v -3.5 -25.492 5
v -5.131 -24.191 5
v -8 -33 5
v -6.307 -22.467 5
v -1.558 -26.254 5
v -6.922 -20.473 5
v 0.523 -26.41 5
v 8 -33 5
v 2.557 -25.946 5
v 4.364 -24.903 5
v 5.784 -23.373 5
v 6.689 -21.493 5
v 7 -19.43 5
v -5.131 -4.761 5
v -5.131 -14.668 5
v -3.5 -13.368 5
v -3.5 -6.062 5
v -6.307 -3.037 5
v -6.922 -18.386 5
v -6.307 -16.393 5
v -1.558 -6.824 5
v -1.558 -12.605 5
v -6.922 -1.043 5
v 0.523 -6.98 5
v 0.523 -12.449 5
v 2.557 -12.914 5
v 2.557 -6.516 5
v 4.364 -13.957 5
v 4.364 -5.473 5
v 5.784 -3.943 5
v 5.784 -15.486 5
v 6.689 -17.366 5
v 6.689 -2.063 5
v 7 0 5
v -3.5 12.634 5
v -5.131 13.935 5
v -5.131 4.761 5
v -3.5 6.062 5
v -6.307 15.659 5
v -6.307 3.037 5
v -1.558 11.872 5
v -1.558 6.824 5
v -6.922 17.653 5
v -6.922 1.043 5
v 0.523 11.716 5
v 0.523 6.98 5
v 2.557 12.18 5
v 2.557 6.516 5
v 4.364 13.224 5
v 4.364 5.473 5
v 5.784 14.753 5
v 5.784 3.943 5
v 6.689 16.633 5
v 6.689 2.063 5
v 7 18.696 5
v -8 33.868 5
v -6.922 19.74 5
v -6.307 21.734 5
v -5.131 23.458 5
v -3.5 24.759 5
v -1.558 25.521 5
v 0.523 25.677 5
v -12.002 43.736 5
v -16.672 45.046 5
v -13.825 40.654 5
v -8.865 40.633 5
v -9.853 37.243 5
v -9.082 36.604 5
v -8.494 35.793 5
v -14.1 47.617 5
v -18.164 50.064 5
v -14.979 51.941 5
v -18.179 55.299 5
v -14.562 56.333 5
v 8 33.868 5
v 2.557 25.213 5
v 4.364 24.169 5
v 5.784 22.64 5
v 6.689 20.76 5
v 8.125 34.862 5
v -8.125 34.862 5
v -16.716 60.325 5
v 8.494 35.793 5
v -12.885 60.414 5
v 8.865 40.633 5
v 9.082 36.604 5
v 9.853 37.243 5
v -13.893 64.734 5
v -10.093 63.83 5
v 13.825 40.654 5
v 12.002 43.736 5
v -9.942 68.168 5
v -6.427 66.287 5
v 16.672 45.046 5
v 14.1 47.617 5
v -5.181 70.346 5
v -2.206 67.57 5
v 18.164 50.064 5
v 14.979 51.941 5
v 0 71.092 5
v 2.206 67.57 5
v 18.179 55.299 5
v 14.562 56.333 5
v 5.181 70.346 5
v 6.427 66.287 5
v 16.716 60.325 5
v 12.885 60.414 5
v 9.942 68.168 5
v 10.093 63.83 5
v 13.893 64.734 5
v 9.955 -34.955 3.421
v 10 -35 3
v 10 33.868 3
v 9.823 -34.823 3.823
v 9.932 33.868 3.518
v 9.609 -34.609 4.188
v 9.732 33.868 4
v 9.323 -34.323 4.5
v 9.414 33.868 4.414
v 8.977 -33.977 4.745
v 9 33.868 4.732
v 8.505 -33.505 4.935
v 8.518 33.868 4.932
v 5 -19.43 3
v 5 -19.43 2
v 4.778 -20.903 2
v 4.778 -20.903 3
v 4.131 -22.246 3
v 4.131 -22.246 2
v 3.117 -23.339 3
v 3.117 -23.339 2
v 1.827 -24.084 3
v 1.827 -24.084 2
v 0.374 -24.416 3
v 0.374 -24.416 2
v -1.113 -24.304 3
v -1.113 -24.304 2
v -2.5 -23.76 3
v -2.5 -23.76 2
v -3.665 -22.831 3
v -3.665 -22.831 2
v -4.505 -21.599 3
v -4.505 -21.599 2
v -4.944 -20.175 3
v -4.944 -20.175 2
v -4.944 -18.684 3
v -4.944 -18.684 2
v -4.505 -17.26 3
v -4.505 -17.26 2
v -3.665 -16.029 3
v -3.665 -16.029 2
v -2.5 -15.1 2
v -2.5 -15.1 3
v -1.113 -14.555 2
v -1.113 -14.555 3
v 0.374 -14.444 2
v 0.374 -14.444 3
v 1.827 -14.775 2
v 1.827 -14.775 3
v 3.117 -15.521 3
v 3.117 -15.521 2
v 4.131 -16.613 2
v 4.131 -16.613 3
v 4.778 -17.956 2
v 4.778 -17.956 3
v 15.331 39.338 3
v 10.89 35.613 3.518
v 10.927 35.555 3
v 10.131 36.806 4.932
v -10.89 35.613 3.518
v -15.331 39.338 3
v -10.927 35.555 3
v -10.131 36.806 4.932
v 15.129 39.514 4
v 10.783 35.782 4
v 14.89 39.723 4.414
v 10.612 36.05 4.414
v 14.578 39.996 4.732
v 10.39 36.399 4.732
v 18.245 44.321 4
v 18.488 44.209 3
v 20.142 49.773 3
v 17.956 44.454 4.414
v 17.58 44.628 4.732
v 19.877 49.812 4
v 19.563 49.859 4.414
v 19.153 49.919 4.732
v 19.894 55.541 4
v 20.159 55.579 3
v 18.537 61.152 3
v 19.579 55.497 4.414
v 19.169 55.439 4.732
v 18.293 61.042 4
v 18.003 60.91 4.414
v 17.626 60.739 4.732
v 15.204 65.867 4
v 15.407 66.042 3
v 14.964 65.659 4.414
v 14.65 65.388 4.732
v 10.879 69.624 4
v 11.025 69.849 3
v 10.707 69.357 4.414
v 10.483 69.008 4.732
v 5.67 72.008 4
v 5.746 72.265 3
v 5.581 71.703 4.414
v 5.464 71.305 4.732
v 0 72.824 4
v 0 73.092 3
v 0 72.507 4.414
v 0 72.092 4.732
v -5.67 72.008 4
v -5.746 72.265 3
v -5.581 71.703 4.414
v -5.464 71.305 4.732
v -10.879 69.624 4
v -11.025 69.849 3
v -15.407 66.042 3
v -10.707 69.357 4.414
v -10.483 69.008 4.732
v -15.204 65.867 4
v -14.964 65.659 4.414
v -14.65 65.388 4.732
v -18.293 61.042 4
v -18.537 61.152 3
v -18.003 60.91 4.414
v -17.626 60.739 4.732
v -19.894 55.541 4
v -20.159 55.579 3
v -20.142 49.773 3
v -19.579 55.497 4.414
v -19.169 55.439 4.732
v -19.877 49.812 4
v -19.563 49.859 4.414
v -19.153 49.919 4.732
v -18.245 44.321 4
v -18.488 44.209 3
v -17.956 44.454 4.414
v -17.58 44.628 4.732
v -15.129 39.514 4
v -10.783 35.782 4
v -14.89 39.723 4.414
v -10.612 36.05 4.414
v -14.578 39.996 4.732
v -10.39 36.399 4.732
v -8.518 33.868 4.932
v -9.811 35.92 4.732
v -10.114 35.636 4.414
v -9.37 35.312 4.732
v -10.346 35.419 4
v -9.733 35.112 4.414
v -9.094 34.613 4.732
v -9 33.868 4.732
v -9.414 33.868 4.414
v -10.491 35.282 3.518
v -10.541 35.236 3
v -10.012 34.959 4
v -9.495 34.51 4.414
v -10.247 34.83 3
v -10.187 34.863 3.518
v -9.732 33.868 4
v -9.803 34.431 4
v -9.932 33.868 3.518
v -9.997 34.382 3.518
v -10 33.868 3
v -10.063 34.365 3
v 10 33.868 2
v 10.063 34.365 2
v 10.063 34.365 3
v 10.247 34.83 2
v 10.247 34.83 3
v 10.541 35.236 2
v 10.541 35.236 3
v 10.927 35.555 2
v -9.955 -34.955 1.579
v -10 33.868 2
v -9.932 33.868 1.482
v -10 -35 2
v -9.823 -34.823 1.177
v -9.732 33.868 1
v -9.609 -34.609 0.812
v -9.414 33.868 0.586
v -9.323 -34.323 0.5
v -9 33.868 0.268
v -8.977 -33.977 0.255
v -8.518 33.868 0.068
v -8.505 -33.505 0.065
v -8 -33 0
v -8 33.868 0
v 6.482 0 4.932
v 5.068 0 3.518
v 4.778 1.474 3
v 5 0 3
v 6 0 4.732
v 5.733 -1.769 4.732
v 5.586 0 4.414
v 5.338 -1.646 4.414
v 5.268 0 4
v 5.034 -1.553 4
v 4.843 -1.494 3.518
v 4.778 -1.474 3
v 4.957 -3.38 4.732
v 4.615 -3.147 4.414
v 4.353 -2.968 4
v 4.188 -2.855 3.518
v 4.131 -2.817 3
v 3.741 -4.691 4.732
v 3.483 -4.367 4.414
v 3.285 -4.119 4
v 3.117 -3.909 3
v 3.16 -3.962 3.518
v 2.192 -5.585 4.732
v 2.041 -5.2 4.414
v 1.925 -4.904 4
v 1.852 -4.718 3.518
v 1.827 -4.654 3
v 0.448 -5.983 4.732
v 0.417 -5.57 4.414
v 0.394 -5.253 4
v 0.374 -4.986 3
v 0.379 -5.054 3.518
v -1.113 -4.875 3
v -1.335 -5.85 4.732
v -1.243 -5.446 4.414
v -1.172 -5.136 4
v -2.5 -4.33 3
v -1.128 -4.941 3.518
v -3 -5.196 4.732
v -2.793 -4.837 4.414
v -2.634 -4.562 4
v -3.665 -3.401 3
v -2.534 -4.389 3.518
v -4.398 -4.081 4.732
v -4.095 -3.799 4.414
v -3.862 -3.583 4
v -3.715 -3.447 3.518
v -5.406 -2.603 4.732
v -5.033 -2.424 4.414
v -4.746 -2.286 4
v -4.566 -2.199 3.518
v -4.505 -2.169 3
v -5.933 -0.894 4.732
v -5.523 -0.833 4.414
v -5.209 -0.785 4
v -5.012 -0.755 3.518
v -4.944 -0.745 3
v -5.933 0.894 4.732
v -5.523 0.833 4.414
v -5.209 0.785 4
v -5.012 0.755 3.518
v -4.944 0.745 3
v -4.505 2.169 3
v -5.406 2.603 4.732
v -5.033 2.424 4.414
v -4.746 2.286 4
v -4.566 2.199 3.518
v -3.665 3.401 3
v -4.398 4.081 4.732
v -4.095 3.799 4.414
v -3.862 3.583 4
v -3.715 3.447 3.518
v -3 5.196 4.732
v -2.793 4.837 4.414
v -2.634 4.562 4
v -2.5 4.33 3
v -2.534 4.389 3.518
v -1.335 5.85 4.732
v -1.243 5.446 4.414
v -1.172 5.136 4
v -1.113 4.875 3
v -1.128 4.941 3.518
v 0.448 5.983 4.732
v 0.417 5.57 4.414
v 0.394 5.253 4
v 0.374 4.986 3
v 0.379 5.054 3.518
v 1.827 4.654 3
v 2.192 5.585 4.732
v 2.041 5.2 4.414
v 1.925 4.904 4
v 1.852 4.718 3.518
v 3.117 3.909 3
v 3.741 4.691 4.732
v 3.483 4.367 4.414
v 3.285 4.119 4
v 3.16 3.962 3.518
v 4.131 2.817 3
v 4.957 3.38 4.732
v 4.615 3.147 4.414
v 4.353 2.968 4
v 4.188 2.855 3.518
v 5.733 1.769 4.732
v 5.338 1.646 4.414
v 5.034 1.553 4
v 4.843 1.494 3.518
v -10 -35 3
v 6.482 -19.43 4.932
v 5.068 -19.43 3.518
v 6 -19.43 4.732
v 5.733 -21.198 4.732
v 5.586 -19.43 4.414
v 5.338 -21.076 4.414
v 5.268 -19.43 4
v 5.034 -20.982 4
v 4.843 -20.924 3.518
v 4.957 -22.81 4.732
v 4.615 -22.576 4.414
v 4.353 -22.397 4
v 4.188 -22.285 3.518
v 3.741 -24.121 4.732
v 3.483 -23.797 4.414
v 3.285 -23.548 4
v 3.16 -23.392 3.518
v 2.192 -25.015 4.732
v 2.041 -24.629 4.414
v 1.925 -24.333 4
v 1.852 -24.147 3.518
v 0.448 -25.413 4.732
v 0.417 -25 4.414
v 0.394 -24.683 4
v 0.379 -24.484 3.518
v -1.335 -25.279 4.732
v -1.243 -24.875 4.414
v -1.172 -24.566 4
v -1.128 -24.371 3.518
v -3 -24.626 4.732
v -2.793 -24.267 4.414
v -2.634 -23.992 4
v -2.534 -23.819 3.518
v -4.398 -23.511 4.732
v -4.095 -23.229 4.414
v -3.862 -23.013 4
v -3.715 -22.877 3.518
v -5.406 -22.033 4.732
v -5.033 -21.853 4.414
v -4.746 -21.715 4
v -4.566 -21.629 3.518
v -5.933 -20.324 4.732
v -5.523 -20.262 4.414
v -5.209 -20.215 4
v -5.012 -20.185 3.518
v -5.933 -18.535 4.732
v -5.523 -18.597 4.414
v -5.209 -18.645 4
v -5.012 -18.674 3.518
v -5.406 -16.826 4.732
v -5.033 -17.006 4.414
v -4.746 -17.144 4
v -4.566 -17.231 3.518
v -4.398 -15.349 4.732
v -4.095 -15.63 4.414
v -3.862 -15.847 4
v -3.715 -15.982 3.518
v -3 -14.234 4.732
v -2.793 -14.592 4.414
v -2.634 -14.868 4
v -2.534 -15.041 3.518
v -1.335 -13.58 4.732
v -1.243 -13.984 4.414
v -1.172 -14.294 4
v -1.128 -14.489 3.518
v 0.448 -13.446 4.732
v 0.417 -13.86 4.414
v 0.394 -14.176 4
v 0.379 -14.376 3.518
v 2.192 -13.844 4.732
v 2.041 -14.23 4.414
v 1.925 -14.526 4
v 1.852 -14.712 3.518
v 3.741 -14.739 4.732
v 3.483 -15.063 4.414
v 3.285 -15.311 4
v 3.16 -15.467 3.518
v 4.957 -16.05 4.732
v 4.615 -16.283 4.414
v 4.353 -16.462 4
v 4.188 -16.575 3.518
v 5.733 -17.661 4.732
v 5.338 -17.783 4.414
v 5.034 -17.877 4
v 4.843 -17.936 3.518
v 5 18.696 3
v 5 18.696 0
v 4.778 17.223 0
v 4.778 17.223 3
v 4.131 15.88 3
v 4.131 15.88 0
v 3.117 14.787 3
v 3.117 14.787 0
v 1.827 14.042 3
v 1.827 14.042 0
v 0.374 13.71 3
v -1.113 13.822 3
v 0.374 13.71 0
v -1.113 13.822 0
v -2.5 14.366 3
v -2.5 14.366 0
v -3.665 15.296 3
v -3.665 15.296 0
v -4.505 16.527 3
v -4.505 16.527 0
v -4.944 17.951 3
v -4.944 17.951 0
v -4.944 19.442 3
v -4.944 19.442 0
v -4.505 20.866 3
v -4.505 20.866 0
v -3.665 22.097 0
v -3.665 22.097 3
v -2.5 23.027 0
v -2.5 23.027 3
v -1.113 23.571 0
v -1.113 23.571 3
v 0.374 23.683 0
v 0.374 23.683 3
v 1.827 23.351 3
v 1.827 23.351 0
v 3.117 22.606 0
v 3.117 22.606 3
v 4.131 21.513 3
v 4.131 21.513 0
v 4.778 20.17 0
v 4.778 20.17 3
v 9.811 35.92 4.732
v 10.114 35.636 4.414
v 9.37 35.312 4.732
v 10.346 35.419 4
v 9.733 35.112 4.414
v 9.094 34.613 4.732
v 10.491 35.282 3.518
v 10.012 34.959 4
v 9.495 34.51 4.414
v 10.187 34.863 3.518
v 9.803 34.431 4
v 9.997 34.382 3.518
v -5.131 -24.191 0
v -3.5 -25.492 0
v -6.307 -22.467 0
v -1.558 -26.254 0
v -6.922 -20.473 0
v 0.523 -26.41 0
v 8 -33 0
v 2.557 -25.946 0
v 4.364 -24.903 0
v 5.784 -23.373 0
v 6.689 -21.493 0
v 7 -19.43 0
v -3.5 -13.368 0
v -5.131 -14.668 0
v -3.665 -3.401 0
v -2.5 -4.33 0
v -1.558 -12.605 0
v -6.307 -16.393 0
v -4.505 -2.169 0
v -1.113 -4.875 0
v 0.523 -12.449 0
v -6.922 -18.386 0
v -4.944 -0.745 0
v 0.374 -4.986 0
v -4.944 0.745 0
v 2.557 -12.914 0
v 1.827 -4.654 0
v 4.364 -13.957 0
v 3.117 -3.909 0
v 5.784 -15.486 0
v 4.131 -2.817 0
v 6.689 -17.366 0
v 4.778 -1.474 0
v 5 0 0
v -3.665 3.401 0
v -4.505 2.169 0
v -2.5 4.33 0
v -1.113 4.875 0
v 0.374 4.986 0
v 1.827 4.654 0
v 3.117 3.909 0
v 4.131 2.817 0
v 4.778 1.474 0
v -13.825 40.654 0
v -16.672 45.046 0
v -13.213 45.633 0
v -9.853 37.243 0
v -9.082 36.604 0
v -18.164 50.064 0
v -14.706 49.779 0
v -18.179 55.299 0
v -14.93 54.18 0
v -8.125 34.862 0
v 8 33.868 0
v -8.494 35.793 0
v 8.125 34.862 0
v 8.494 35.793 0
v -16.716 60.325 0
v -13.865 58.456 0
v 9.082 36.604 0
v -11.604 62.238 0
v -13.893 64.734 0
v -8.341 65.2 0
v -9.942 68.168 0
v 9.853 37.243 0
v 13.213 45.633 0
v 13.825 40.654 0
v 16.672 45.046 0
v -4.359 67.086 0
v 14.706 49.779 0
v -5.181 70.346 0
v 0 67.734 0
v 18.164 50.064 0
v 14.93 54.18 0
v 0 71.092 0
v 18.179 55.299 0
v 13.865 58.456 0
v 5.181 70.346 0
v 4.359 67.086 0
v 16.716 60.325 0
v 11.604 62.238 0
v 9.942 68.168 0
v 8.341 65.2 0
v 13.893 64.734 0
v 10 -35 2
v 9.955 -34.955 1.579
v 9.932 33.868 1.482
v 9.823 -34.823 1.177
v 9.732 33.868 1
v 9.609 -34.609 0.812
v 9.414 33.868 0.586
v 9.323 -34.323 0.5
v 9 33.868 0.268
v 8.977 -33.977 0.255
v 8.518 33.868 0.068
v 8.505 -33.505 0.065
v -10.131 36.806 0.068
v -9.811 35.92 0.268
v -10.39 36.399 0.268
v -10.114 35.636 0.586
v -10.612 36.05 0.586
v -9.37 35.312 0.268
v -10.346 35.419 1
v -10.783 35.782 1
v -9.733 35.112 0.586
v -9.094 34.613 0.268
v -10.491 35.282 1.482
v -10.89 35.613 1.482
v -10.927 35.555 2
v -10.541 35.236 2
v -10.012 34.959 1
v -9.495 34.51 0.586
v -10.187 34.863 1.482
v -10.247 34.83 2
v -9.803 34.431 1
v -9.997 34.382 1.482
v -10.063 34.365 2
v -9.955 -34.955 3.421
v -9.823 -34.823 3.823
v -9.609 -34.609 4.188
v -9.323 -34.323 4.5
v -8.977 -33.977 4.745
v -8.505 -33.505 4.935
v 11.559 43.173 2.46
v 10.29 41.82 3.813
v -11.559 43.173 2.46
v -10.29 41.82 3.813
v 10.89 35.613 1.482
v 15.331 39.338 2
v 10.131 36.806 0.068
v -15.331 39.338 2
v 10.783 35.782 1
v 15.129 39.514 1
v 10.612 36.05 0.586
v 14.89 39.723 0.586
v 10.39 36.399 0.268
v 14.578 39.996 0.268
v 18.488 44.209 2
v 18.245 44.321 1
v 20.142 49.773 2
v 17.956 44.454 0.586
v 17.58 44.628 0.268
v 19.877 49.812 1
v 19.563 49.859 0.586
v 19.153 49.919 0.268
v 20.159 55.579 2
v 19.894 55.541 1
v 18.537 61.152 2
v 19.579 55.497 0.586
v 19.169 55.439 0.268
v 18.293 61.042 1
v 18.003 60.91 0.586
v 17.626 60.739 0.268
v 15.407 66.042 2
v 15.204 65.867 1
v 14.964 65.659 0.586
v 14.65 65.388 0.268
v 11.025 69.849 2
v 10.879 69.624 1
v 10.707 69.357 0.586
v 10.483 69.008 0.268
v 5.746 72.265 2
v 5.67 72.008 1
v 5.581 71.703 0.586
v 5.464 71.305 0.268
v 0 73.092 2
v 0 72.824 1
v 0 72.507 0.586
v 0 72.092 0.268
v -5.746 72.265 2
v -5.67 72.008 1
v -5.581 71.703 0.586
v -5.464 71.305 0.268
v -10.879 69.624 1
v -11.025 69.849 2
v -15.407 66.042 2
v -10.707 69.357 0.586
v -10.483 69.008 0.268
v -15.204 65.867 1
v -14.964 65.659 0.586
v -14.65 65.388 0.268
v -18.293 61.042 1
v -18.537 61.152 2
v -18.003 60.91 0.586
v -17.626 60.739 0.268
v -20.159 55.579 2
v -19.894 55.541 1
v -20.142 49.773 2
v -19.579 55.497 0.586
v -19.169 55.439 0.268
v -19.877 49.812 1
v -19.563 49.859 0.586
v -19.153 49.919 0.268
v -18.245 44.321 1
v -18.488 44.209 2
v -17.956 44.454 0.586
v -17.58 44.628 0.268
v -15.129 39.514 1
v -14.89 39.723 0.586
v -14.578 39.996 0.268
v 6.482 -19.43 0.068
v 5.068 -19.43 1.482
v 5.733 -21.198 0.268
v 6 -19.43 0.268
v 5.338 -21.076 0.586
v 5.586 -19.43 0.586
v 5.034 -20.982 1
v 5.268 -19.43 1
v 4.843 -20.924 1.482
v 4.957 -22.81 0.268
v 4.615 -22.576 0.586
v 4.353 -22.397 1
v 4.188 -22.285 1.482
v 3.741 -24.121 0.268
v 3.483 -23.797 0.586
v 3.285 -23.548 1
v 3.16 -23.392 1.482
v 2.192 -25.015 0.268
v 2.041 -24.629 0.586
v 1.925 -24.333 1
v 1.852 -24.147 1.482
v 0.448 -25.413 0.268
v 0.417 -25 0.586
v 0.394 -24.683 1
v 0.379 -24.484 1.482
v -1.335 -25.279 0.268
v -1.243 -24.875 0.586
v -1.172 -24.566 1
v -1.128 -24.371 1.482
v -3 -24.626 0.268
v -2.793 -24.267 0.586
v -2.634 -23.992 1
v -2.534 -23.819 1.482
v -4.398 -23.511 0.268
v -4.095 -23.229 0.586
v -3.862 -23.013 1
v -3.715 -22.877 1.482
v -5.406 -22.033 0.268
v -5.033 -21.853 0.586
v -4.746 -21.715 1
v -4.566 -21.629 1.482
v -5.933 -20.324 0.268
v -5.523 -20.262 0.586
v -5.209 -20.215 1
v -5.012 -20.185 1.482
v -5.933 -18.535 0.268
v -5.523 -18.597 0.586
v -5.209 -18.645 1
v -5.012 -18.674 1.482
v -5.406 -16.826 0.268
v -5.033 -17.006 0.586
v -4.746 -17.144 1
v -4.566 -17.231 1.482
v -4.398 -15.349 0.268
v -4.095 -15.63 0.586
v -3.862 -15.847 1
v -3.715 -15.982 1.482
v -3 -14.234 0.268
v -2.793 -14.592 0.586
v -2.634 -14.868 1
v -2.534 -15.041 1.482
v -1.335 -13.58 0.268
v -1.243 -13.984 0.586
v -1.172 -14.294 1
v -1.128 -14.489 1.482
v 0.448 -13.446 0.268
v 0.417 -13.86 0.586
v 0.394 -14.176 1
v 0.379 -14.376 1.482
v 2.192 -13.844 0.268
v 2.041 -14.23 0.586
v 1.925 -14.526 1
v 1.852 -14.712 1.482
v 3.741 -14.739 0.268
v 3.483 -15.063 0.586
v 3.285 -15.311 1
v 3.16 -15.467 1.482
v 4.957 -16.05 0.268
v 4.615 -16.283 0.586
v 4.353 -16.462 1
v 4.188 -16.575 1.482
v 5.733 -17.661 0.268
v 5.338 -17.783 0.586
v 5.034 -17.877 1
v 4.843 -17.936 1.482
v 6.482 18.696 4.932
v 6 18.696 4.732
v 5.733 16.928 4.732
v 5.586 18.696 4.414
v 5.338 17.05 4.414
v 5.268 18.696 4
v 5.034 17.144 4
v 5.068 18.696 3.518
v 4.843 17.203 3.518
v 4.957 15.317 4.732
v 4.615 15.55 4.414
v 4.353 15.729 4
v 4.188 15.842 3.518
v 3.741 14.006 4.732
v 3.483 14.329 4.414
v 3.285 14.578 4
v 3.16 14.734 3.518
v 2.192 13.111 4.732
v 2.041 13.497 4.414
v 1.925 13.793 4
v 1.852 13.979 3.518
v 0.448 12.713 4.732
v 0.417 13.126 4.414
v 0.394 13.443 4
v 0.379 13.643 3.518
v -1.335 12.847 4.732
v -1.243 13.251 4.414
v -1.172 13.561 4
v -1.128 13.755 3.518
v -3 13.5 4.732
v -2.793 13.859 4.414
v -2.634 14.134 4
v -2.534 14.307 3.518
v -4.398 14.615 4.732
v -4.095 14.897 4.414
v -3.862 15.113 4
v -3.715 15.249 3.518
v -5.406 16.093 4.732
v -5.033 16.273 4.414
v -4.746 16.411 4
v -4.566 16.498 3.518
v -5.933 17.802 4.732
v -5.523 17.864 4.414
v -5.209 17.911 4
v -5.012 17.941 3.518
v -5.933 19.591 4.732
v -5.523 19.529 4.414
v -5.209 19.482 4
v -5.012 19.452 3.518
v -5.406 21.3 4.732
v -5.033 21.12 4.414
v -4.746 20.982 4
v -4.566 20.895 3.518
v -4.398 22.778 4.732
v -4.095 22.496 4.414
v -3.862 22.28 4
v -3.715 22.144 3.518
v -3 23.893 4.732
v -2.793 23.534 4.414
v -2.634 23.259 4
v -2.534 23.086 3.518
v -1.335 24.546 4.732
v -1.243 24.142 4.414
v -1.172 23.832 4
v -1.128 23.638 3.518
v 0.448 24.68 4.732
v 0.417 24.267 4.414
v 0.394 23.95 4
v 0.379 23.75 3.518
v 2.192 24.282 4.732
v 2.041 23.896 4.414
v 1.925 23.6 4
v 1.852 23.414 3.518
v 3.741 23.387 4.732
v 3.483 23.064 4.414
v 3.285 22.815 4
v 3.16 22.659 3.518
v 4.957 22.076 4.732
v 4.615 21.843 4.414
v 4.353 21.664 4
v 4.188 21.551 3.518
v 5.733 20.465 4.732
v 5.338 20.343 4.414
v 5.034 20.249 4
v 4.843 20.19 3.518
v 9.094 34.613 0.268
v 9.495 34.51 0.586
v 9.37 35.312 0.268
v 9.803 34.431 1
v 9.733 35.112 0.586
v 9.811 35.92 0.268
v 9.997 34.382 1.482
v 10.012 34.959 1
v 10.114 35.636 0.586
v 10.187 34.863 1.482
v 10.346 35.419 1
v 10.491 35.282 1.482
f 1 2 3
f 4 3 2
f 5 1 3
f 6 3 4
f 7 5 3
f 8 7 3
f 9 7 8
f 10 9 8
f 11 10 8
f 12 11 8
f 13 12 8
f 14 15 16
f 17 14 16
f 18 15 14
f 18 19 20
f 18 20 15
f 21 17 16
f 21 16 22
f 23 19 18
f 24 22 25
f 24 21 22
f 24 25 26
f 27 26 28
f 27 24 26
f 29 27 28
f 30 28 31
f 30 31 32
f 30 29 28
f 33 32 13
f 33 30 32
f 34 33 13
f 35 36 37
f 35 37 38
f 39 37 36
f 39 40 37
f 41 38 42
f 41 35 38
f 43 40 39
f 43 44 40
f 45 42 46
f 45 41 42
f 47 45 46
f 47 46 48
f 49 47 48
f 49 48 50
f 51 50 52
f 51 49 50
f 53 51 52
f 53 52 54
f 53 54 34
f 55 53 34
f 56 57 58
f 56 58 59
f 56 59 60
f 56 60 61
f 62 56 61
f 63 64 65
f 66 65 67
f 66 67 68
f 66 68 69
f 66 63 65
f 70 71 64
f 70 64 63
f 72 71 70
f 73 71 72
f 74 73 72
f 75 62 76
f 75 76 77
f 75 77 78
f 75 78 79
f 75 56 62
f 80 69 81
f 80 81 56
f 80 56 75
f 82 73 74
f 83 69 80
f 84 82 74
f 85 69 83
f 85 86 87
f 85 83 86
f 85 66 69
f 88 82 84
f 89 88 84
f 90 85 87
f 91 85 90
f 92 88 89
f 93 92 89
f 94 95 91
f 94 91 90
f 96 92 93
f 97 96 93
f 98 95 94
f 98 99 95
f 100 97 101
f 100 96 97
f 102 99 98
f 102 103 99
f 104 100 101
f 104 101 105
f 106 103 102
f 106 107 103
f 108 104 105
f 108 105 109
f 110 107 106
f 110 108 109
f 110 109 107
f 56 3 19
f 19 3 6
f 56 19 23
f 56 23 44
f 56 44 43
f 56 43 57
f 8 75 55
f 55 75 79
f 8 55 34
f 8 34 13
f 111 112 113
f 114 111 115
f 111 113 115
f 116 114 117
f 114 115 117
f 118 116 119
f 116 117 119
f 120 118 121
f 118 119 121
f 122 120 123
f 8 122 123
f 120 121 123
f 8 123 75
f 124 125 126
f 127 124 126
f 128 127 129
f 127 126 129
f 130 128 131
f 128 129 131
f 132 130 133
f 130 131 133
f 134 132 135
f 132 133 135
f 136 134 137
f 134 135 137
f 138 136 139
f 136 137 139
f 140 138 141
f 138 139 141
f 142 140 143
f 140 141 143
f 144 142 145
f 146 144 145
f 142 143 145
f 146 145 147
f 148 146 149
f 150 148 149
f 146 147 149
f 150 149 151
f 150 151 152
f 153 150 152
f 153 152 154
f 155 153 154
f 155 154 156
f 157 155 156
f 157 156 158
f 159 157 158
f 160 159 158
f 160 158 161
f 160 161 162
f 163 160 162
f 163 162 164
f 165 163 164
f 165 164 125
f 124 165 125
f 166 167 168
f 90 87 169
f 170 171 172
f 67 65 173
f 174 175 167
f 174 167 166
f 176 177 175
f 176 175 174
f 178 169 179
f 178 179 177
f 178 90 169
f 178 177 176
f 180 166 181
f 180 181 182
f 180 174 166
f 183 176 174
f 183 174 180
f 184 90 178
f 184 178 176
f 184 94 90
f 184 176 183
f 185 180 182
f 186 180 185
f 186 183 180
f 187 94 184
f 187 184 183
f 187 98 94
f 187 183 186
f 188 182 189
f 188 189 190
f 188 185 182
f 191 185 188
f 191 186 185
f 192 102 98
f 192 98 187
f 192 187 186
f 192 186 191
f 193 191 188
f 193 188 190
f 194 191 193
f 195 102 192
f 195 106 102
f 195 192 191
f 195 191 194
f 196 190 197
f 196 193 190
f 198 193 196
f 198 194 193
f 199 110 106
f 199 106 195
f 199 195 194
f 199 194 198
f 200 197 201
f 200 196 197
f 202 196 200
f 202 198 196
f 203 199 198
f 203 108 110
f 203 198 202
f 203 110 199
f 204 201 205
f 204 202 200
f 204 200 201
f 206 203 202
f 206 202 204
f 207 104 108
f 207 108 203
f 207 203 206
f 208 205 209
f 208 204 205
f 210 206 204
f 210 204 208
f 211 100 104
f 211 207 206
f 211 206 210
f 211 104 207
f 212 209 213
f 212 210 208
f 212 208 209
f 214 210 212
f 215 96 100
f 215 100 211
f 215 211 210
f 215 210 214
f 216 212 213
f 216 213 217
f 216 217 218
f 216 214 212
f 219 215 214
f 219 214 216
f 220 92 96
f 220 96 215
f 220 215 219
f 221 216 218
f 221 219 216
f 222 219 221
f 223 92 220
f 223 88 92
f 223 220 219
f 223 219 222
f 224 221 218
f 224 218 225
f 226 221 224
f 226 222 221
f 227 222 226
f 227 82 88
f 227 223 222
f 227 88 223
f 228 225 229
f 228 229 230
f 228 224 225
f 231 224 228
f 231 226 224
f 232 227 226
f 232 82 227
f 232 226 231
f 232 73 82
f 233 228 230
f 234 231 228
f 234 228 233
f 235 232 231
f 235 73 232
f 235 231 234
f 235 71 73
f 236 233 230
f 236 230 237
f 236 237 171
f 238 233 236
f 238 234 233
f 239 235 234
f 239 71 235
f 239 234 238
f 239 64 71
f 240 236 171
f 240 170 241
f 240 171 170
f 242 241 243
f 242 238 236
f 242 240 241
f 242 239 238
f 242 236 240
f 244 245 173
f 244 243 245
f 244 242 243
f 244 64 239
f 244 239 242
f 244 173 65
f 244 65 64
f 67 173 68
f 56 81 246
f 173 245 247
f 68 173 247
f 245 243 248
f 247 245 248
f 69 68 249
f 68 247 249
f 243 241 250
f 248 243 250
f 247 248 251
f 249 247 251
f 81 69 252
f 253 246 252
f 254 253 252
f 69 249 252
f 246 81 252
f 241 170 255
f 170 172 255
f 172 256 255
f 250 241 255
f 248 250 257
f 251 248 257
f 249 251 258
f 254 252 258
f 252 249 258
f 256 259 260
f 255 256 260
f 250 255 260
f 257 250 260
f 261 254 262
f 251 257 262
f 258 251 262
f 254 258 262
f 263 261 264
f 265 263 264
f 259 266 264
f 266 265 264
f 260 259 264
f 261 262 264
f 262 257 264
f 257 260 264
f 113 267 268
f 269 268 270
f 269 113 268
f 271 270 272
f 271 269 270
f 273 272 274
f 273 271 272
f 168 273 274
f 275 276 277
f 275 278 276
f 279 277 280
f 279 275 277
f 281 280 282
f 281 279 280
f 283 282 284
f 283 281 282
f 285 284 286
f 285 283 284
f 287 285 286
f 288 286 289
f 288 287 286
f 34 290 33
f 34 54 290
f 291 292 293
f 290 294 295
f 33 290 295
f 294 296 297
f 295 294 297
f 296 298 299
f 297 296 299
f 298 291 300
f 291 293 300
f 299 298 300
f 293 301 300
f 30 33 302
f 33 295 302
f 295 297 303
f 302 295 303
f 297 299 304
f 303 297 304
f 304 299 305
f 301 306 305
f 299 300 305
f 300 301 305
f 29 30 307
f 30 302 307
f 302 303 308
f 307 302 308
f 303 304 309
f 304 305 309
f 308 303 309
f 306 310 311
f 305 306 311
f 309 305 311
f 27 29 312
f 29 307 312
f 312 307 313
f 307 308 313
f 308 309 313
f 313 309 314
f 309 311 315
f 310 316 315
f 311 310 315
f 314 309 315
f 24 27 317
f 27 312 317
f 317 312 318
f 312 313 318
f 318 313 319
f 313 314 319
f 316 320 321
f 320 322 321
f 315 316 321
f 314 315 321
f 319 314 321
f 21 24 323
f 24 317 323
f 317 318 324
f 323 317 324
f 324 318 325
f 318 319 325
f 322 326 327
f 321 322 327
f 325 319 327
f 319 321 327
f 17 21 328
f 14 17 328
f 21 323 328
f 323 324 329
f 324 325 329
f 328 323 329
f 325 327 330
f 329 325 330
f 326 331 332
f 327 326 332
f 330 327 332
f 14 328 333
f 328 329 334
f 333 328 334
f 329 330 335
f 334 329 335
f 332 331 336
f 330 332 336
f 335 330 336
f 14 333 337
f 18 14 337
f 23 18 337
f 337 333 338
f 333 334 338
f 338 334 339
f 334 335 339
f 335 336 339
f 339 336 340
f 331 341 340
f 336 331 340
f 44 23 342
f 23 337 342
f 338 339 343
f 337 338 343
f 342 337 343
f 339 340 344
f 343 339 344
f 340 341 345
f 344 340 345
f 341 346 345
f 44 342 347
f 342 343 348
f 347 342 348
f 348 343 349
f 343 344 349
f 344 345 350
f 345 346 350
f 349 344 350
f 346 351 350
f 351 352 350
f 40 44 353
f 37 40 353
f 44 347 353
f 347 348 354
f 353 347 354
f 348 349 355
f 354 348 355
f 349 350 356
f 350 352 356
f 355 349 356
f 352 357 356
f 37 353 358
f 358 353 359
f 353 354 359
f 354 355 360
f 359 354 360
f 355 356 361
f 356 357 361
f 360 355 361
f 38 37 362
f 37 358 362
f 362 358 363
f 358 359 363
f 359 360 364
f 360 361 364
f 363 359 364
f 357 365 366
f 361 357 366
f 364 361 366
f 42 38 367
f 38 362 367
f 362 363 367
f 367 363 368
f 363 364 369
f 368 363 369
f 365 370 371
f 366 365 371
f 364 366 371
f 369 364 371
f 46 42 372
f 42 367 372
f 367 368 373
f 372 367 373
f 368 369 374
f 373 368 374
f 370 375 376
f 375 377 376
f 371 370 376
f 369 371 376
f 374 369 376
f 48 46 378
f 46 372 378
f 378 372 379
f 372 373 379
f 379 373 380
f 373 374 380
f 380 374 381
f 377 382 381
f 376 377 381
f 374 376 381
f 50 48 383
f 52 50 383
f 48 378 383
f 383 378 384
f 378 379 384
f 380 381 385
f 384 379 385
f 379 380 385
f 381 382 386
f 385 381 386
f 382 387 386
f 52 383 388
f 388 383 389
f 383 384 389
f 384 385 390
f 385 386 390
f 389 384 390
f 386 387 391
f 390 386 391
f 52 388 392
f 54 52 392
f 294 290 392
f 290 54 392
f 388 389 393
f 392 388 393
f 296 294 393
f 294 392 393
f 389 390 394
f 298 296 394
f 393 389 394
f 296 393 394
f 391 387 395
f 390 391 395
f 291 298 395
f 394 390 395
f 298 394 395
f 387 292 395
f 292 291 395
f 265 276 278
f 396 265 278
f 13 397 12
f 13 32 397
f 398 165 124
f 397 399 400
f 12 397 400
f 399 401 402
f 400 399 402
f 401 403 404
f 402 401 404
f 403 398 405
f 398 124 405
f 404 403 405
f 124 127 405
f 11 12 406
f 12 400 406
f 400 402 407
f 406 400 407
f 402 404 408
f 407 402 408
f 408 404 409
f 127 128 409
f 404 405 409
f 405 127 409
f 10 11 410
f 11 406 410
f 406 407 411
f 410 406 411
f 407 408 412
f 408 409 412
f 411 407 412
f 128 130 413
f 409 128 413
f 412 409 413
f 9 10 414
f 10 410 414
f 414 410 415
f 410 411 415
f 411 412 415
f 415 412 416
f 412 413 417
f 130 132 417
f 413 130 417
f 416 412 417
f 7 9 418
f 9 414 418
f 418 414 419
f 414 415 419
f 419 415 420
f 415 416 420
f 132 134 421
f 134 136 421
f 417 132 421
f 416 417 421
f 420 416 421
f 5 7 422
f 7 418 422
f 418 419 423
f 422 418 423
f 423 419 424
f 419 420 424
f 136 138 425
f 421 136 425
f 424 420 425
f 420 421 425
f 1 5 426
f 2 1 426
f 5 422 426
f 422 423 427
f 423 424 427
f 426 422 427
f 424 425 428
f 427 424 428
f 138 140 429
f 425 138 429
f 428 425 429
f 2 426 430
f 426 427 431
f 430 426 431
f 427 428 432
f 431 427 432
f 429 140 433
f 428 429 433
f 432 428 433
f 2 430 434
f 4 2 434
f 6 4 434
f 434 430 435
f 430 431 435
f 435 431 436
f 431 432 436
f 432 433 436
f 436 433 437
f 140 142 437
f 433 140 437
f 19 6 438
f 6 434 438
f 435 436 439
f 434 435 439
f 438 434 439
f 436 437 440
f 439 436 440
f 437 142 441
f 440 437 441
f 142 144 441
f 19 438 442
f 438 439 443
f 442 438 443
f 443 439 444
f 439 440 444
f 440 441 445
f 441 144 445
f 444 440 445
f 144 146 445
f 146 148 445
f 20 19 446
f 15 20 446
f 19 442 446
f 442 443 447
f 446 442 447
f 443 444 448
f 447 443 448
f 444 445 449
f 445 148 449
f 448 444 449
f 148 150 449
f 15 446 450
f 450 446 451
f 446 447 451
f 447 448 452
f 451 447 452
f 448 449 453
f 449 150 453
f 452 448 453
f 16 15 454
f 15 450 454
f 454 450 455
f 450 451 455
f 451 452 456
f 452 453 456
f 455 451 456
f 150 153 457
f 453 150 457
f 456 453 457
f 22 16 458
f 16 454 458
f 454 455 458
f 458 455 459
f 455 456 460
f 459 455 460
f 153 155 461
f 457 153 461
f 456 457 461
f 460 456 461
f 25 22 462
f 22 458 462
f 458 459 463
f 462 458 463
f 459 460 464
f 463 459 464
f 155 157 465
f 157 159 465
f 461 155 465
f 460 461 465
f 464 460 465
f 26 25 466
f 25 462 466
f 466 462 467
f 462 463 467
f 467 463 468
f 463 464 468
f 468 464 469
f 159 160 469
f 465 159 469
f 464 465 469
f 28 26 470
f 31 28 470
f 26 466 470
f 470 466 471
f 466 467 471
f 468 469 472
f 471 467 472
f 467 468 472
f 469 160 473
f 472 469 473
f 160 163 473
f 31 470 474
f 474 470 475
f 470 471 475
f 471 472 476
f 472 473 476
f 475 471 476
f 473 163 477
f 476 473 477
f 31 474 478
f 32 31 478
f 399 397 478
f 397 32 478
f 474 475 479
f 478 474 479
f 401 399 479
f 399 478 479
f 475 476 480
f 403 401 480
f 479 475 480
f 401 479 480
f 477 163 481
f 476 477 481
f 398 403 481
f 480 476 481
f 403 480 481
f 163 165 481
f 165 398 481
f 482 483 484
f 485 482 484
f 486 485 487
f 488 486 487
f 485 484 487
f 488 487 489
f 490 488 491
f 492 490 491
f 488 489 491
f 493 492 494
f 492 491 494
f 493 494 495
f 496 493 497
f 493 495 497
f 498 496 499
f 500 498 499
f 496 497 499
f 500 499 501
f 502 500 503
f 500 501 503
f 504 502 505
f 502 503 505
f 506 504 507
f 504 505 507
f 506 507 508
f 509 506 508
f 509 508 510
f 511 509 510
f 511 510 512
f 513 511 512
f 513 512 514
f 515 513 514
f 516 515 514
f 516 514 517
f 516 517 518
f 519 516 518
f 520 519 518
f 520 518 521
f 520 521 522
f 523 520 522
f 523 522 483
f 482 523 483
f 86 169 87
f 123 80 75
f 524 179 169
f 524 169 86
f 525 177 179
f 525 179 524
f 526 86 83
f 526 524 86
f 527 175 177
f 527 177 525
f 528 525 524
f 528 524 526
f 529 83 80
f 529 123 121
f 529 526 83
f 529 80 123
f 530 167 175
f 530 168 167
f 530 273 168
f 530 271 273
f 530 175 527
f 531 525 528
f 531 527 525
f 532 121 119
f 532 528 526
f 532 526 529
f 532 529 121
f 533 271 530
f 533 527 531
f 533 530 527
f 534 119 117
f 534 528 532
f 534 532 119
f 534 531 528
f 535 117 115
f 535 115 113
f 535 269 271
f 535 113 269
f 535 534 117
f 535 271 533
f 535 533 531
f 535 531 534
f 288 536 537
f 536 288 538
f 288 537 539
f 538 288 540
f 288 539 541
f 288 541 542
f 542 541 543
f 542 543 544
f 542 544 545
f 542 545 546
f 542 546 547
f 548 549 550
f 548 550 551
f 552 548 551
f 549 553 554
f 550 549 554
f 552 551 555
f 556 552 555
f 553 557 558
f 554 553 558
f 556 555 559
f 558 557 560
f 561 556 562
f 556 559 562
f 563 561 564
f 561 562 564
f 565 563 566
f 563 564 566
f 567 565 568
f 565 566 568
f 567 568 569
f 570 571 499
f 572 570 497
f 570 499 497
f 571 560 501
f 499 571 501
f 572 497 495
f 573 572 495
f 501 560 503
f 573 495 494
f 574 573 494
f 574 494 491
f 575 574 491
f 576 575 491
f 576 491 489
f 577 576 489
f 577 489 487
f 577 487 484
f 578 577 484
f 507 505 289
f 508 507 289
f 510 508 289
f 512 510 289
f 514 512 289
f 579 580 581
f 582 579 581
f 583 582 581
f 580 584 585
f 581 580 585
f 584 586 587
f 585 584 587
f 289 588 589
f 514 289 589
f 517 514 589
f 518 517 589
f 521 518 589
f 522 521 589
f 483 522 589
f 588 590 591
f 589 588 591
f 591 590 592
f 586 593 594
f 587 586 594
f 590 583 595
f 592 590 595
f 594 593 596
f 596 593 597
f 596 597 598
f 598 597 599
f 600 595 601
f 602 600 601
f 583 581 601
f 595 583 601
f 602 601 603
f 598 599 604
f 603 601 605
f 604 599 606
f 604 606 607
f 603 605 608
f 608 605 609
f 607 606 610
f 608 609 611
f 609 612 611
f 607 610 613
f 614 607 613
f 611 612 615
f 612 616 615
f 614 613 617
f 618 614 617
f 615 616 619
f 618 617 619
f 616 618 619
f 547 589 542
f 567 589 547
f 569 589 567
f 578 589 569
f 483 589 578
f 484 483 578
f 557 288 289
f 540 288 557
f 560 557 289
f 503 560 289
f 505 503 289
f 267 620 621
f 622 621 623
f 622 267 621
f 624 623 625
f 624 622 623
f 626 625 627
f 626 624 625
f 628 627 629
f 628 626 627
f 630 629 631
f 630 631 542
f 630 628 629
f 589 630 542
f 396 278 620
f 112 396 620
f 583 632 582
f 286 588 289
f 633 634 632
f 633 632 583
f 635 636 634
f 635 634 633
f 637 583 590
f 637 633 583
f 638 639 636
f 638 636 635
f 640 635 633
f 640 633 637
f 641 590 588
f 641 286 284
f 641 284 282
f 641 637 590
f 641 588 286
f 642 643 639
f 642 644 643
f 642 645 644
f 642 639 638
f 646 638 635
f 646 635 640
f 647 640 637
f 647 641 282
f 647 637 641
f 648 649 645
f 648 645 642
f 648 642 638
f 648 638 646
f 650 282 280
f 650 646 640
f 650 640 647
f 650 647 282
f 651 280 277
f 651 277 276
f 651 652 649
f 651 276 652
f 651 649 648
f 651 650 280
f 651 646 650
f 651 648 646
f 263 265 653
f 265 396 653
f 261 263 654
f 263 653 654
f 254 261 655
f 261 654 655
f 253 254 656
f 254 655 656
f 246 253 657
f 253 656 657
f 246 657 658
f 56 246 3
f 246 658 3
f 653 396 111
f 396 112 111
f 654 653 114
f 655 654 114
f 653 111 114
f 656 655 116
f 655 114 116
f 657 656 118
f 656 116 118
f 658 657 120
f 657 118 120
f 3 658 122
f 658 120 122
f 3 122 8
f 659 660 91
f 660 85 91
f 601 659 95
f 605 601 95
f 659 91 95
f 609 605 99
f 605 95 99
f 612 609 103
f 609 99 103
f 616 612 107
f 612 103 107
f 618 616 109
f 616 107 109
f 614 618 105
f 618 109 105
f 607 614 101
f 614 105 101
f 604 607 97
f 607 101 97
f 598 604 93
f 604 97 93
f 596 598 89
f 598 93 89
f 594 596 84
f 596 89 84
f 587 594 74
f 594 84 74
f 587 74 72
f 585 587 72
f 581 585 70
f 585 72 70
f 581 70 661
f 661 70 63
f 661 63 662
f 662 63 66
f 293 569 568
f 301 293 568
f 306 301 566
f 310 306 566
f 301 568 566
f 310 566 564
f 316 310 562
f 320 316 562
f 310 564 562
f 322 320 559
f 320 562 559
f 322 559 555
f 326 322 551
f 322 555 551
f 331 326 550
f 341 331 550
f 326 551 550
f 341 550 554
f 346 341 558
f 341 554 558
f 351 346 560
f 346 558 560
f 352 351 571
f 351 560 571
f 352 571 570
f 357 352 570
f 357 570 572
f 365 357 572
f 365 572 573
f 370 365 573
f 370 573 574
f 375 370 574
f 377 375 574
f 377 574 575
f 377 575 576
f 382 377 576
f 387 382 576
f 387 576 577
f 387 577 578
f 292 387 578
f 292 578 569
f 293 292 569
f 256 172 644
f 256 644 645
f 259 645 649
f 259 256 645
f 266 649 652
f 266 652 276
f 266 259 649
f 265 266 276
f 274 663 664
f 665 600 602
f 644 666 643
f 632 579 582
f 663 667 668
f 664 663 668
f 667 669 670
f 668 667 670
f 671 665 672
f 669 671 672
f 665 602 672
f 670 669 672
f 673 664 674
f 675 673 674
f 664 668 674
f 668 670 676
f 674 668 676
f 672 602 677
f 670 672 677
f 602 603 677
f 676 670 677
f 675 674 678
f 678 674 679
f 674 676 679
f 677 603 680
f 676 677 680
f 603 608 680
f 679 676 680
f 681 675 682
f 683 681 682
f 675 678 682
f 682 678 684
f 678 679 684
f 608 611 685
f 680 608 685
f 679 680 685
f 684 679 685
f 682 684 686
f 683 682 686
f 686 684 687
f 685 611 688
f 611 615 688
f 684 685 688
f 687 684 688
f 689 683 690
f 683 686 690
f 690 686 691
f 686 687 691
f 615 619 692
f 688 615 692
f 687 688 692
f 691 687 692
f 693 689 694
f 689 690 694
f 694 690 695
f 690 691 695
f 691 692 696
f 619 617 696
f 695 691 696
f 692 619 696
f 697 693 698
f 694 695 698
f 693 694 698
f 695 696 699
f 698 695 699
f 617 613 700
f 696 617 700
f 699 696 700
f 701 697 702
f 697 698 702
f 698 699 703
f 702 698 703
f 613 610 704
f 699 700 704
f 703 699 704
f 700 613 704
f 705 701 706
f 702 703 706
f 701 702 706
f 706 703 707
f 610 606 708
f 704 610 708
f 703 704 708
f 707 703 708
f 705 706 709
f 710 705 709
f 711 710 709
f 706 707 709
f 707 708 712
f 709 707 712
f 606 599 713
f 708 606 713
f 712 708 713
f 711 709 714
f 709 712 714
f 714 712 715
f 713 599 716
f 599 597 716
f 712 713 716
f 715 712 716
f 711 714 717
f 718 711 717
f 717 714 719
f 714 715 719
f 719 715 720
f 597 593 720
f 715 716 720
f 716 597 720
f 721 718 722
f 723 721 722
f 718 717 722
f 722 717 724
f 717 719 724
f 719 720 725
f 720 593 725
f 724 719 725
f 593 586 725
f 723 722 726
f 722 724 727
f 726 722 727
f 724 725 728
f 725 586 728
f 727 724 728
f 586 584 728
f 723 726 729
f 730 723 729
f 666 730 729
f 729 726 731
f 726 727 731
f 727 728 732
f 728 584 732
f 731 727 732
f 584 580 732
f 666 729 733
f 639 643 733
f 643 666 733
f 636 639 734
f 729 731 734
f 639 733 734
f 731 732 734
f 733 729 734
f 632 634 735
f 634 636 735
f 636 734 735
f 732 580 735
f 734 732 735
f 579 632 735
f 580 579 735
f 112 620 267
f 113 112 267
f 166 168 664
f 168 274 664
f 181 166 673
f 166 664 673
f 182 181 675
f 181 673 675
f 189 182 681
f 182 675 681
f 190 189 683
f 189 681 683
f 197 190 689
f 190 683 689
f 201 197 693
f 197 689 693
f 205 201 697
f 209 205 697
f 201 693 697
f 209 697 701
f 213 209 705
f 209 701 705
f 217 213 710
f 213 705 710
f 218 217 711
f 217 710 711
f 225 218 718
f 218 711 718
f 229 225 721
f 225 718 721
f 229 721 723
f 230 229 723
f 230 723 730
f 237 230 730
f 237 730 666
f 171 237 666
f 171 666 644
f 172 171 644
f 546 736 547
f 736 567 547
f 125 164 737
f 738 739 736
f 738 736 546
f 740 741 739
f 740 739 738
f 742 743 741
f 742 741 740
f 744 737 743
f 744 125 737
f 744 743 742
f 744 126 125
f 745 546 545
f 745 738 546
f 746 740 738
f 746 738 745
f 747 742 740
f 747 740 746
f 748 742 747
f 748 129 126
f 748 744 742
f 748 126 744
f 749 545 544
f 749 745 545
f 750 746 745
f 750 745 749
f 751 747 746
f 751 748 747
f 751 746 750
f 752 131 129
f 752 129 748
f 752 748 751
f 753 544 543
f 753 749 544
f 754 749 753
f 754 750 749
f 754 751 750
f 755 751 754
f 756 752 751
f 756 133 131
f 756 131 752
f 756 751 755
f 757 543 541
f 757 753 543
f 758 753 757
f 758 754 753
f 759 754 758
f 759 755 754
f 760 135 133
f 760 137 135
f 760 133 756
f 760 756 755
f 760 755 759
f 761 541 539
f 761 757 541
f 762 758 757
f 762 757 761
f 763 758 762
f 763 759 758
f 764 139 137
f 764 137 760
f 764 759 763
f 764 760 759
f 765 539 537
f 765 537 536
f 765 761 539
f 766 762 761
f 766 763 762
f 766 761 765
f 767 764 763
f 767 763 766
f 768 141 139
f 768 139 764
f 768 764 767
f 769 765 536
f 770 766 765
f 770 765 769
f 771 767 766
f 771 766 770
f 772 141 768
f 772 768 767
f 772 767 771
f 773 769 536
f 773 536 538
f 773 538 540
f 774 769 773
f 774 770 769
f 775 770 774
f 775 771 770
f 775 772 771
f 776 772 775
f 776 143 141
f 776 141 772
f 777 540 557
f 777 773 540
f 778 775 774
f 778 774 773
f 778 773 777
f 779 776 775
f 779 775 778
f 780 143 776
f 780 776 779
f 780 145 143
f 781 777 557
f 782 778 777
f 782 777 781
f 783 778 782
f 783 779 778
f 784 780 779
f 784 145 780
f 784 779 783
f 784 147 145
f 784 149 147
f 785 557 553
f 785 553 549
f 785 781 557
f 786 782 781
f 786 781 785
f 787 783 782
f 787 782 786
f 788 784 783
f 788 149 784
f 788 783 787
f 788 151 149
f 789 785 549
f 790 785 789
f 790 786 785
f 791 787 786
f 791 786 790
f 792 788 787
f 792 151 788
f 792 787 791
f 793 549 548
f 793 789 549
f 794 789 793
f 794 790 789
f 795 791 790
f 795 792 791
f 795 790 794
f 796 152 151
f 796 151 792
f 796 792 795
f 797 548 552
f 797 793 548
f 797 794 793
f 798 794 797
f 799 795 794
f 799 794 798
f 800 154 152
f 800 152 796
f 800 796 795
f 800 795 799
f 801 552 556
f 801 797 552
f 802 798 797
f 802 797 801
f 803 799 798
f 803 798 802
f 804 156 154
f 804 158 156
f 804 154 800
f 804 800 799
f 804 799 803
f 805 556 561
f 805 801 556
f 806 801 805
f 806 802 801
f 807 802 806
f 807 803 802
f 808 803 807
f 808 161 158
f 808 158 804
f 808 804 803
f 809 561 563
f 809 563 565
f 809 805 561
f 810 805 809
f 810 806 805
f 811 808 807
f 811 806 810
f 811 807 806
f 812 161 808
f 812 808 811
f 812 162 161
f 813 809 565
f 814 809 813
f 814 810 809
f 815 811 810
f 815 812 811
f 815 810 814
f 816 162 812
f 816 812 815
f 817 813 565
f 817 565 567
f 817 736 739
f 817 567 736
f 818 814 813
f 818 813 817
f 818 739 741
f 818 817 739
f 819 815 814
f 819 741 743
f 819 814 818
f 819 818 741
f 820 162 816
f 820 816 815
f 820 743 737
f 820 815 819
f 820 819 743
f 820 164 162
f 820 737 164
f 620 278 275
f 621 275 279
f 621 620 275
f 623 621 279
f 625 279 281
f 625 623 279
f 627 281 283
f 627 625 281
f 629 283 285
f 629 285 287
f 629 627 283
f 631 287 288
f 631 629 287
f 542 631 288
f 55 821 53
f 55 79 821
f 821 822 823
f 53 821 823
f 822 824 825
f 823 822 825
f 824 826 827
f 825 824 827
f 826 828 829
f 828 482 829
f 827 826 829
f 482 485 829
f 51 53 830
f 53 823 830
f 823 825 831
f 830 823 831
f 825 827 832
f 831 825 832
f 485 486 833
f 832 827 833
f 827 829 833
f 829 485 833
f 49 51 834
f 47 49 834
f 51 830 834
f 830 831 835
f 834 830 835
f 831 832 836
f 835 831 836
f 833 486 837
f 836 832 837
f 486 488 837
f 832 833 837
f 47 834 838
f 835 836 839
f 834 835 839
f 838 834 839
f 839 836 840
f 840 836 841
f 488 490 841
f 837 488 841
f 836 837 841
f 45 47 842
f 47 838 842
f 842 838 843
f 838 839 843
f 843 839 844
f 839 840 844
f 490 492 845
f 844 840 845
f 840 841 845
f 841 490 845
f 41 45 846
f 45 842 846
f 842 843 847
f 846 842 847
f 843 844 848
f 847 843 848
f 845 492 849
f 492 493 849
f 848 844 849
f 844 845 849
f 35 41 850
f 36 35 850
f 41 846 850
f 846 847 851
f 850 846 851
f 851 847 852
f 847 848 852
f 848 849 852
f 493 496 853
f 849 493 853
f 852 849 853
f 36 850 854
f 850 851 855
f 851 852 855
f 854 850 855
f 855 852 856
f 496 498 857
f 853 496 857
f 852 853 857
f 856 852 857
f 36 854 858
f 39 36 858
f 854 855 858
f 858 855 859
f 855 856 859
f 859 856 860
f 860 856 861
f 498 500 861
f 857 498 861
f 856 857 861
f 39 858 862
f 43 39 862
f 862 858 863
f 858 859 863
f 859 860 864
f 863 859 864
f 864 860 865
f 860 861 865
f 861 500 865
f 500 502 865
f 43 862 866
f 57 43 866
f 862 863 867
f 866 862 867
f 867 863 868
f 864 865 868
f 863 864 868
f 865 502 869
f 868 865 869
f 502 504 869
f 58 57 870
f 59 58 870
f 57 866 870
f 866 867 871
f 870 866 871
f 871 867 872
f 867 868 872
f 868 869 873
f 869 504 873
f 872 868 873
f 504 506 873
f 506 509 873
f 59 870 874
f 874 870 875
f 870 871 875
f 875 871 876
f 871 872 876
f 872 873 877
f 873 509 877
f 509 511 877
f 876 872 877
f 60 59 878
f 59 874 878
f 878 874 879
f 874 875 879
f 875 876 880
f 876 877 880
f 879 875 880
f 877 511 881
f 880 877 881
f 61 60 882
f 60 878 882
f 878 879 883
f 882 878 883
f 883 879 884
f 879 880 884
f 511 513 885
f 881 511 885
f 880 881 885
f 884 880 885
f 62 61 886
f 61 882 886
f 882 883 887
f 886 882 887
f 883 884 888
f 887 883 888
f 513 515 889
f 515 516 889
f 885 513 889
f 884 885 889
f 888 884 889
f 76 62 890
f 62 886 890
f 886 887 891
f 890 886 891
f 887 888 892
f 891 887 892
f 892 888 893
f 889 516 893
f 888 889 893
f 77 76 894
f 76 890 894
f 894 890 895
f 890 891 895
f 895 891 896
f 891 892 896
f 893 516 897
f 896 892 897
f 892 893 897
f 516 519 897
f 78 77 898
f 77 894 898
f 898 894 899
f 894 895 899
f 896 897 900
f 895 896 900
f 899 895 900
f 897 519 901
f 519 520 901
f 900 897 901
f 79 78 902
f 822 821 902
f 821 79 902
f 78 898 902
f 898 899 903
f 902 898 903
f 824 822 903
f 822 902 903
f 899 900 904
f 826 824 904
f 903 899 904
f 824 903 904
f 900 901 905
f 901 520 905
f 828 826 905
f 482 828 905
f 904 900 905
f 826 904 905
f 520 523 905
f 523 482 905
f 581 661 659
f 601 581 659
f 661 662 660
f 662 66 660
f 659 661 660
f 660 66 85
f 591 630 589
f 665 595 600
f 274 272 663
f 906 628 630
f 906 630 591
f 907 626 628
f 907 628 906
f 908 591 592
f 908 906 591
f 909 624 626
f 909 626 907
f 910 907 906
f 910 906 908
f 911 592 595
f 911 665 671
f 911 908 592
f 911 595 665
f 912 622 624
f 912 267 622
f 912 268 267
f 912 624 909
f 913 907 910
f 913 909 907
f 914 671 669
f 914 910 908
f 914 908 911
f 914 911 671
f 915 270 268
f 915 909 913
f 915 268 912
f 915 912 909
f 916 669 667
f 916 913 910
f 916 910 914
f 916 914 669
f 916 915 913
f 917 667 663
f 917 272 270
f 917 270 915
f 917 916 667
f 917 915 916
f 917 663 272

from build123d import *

# Parameters (mm, degrees)
F1_DEPTH = 5
F2_R     = 2
F3_R     = 15
F4_DEPTH = 25.4
F5_R     = 5
F6_DEPTH = 25.4
F7_R     = 2
F9_DEPTH = 5
F10_SIZE = 4.99999


# Not quite as in the source:
# - a fillet or chamfer is up to 0.001 mm smaller than in the source, because OpenCascade refuses the exact size


with BuildPart() as f1:
    # F0 (on Top) → F1 (new body)
    with BuildSketch(Plane.XY):
        with BuildLine():
            Line((-10, -35), (10, -35))
            Line((10, -35), (10, 35))
            ThreePointArc((10, 35), (0, 73.0924170341), (-10, 35))
            Line((-10, 35), (-10, -35))
        make_face()
    extrude(amount=F1_DEPTH)

    # F2
    f2_edges = [f1.edges().sort_by_distance(p)[0] for p in [
        (0, 73.092417, 5),
        (10, 0, 5),
        (-10, 0, 5),
        (0, -35, 5),
        (10, 0, 0),
        (0, 73.092417, 0),
        (-10, 0, 0),
        (-10, 35, 2.5),
        (10, 35, 2.5),
        (0, -35, 0),
    ]]
    fillet(f2_edges, radius=F2_R)

    # F3 (on face) → F4 (cut)
    with BuildSketch(Plane.XY.offset(5)):
        with Locations((0, 52.7336113155)):
            Circle(F3_R)
    extrude(amount=-F4_DEPTH, mode=Mode.SUBTRACT)

    # F5 (on face) → F6 (cut)
    with BuildSketch(Plane(origin=(0, 0, 0), x_dir=(1, 0, 0), z_dir=(0, 0, -1))):
        Circle(F5_R)
        with Locations((0, -18.6964944005)):
            Circle(F5_R)
        with Locations((0, 19.4296911359)):
            Circle(F5_R)
    extrude(amount=-F6_DEPTH, mode=Mode.SUBTRACT)

    # F7
    f7_edges = [f1.edges().sort_by_distance(p)[0] for p in [
        (-5, -19.429691, 0),
        (5, -19.429691, 2.5),
        (-5, -19.429691, 5),
        (-5, 0, 5),
        (-5, 18.696494, 5),
    ]]
    fillet(f7_edges, radius=F7_R)

    # F8 (on face) → F9 (join)
    with BuildSketch(Plane(origin=(0, 0, 0), x_dir=(1, 0, 0), z_dir=(0, 0, -1))):
        with BuildLine():
            ThreePointArc((13.2130736886, -45.6332814852), (0, -37.7336113155), (-13.2130736886, -45.6332814852))
            Line((-13.2130736886, -45.6332814852), (13.2130736886, -45.6332814852))
        make_face()
    extrude(amount=-F9_DEPTH)

    # F10 (size 5 in the source; OpenCascade refuses exactly that, so slightly less here)
    f10_edges = [f1.edges().sort_by_distance(p)[0] for p in [
        (0, 45.633281, 5),
    ]]
    chamfer(f10_edges, length=F10_SIZE)


solid = f1.part
